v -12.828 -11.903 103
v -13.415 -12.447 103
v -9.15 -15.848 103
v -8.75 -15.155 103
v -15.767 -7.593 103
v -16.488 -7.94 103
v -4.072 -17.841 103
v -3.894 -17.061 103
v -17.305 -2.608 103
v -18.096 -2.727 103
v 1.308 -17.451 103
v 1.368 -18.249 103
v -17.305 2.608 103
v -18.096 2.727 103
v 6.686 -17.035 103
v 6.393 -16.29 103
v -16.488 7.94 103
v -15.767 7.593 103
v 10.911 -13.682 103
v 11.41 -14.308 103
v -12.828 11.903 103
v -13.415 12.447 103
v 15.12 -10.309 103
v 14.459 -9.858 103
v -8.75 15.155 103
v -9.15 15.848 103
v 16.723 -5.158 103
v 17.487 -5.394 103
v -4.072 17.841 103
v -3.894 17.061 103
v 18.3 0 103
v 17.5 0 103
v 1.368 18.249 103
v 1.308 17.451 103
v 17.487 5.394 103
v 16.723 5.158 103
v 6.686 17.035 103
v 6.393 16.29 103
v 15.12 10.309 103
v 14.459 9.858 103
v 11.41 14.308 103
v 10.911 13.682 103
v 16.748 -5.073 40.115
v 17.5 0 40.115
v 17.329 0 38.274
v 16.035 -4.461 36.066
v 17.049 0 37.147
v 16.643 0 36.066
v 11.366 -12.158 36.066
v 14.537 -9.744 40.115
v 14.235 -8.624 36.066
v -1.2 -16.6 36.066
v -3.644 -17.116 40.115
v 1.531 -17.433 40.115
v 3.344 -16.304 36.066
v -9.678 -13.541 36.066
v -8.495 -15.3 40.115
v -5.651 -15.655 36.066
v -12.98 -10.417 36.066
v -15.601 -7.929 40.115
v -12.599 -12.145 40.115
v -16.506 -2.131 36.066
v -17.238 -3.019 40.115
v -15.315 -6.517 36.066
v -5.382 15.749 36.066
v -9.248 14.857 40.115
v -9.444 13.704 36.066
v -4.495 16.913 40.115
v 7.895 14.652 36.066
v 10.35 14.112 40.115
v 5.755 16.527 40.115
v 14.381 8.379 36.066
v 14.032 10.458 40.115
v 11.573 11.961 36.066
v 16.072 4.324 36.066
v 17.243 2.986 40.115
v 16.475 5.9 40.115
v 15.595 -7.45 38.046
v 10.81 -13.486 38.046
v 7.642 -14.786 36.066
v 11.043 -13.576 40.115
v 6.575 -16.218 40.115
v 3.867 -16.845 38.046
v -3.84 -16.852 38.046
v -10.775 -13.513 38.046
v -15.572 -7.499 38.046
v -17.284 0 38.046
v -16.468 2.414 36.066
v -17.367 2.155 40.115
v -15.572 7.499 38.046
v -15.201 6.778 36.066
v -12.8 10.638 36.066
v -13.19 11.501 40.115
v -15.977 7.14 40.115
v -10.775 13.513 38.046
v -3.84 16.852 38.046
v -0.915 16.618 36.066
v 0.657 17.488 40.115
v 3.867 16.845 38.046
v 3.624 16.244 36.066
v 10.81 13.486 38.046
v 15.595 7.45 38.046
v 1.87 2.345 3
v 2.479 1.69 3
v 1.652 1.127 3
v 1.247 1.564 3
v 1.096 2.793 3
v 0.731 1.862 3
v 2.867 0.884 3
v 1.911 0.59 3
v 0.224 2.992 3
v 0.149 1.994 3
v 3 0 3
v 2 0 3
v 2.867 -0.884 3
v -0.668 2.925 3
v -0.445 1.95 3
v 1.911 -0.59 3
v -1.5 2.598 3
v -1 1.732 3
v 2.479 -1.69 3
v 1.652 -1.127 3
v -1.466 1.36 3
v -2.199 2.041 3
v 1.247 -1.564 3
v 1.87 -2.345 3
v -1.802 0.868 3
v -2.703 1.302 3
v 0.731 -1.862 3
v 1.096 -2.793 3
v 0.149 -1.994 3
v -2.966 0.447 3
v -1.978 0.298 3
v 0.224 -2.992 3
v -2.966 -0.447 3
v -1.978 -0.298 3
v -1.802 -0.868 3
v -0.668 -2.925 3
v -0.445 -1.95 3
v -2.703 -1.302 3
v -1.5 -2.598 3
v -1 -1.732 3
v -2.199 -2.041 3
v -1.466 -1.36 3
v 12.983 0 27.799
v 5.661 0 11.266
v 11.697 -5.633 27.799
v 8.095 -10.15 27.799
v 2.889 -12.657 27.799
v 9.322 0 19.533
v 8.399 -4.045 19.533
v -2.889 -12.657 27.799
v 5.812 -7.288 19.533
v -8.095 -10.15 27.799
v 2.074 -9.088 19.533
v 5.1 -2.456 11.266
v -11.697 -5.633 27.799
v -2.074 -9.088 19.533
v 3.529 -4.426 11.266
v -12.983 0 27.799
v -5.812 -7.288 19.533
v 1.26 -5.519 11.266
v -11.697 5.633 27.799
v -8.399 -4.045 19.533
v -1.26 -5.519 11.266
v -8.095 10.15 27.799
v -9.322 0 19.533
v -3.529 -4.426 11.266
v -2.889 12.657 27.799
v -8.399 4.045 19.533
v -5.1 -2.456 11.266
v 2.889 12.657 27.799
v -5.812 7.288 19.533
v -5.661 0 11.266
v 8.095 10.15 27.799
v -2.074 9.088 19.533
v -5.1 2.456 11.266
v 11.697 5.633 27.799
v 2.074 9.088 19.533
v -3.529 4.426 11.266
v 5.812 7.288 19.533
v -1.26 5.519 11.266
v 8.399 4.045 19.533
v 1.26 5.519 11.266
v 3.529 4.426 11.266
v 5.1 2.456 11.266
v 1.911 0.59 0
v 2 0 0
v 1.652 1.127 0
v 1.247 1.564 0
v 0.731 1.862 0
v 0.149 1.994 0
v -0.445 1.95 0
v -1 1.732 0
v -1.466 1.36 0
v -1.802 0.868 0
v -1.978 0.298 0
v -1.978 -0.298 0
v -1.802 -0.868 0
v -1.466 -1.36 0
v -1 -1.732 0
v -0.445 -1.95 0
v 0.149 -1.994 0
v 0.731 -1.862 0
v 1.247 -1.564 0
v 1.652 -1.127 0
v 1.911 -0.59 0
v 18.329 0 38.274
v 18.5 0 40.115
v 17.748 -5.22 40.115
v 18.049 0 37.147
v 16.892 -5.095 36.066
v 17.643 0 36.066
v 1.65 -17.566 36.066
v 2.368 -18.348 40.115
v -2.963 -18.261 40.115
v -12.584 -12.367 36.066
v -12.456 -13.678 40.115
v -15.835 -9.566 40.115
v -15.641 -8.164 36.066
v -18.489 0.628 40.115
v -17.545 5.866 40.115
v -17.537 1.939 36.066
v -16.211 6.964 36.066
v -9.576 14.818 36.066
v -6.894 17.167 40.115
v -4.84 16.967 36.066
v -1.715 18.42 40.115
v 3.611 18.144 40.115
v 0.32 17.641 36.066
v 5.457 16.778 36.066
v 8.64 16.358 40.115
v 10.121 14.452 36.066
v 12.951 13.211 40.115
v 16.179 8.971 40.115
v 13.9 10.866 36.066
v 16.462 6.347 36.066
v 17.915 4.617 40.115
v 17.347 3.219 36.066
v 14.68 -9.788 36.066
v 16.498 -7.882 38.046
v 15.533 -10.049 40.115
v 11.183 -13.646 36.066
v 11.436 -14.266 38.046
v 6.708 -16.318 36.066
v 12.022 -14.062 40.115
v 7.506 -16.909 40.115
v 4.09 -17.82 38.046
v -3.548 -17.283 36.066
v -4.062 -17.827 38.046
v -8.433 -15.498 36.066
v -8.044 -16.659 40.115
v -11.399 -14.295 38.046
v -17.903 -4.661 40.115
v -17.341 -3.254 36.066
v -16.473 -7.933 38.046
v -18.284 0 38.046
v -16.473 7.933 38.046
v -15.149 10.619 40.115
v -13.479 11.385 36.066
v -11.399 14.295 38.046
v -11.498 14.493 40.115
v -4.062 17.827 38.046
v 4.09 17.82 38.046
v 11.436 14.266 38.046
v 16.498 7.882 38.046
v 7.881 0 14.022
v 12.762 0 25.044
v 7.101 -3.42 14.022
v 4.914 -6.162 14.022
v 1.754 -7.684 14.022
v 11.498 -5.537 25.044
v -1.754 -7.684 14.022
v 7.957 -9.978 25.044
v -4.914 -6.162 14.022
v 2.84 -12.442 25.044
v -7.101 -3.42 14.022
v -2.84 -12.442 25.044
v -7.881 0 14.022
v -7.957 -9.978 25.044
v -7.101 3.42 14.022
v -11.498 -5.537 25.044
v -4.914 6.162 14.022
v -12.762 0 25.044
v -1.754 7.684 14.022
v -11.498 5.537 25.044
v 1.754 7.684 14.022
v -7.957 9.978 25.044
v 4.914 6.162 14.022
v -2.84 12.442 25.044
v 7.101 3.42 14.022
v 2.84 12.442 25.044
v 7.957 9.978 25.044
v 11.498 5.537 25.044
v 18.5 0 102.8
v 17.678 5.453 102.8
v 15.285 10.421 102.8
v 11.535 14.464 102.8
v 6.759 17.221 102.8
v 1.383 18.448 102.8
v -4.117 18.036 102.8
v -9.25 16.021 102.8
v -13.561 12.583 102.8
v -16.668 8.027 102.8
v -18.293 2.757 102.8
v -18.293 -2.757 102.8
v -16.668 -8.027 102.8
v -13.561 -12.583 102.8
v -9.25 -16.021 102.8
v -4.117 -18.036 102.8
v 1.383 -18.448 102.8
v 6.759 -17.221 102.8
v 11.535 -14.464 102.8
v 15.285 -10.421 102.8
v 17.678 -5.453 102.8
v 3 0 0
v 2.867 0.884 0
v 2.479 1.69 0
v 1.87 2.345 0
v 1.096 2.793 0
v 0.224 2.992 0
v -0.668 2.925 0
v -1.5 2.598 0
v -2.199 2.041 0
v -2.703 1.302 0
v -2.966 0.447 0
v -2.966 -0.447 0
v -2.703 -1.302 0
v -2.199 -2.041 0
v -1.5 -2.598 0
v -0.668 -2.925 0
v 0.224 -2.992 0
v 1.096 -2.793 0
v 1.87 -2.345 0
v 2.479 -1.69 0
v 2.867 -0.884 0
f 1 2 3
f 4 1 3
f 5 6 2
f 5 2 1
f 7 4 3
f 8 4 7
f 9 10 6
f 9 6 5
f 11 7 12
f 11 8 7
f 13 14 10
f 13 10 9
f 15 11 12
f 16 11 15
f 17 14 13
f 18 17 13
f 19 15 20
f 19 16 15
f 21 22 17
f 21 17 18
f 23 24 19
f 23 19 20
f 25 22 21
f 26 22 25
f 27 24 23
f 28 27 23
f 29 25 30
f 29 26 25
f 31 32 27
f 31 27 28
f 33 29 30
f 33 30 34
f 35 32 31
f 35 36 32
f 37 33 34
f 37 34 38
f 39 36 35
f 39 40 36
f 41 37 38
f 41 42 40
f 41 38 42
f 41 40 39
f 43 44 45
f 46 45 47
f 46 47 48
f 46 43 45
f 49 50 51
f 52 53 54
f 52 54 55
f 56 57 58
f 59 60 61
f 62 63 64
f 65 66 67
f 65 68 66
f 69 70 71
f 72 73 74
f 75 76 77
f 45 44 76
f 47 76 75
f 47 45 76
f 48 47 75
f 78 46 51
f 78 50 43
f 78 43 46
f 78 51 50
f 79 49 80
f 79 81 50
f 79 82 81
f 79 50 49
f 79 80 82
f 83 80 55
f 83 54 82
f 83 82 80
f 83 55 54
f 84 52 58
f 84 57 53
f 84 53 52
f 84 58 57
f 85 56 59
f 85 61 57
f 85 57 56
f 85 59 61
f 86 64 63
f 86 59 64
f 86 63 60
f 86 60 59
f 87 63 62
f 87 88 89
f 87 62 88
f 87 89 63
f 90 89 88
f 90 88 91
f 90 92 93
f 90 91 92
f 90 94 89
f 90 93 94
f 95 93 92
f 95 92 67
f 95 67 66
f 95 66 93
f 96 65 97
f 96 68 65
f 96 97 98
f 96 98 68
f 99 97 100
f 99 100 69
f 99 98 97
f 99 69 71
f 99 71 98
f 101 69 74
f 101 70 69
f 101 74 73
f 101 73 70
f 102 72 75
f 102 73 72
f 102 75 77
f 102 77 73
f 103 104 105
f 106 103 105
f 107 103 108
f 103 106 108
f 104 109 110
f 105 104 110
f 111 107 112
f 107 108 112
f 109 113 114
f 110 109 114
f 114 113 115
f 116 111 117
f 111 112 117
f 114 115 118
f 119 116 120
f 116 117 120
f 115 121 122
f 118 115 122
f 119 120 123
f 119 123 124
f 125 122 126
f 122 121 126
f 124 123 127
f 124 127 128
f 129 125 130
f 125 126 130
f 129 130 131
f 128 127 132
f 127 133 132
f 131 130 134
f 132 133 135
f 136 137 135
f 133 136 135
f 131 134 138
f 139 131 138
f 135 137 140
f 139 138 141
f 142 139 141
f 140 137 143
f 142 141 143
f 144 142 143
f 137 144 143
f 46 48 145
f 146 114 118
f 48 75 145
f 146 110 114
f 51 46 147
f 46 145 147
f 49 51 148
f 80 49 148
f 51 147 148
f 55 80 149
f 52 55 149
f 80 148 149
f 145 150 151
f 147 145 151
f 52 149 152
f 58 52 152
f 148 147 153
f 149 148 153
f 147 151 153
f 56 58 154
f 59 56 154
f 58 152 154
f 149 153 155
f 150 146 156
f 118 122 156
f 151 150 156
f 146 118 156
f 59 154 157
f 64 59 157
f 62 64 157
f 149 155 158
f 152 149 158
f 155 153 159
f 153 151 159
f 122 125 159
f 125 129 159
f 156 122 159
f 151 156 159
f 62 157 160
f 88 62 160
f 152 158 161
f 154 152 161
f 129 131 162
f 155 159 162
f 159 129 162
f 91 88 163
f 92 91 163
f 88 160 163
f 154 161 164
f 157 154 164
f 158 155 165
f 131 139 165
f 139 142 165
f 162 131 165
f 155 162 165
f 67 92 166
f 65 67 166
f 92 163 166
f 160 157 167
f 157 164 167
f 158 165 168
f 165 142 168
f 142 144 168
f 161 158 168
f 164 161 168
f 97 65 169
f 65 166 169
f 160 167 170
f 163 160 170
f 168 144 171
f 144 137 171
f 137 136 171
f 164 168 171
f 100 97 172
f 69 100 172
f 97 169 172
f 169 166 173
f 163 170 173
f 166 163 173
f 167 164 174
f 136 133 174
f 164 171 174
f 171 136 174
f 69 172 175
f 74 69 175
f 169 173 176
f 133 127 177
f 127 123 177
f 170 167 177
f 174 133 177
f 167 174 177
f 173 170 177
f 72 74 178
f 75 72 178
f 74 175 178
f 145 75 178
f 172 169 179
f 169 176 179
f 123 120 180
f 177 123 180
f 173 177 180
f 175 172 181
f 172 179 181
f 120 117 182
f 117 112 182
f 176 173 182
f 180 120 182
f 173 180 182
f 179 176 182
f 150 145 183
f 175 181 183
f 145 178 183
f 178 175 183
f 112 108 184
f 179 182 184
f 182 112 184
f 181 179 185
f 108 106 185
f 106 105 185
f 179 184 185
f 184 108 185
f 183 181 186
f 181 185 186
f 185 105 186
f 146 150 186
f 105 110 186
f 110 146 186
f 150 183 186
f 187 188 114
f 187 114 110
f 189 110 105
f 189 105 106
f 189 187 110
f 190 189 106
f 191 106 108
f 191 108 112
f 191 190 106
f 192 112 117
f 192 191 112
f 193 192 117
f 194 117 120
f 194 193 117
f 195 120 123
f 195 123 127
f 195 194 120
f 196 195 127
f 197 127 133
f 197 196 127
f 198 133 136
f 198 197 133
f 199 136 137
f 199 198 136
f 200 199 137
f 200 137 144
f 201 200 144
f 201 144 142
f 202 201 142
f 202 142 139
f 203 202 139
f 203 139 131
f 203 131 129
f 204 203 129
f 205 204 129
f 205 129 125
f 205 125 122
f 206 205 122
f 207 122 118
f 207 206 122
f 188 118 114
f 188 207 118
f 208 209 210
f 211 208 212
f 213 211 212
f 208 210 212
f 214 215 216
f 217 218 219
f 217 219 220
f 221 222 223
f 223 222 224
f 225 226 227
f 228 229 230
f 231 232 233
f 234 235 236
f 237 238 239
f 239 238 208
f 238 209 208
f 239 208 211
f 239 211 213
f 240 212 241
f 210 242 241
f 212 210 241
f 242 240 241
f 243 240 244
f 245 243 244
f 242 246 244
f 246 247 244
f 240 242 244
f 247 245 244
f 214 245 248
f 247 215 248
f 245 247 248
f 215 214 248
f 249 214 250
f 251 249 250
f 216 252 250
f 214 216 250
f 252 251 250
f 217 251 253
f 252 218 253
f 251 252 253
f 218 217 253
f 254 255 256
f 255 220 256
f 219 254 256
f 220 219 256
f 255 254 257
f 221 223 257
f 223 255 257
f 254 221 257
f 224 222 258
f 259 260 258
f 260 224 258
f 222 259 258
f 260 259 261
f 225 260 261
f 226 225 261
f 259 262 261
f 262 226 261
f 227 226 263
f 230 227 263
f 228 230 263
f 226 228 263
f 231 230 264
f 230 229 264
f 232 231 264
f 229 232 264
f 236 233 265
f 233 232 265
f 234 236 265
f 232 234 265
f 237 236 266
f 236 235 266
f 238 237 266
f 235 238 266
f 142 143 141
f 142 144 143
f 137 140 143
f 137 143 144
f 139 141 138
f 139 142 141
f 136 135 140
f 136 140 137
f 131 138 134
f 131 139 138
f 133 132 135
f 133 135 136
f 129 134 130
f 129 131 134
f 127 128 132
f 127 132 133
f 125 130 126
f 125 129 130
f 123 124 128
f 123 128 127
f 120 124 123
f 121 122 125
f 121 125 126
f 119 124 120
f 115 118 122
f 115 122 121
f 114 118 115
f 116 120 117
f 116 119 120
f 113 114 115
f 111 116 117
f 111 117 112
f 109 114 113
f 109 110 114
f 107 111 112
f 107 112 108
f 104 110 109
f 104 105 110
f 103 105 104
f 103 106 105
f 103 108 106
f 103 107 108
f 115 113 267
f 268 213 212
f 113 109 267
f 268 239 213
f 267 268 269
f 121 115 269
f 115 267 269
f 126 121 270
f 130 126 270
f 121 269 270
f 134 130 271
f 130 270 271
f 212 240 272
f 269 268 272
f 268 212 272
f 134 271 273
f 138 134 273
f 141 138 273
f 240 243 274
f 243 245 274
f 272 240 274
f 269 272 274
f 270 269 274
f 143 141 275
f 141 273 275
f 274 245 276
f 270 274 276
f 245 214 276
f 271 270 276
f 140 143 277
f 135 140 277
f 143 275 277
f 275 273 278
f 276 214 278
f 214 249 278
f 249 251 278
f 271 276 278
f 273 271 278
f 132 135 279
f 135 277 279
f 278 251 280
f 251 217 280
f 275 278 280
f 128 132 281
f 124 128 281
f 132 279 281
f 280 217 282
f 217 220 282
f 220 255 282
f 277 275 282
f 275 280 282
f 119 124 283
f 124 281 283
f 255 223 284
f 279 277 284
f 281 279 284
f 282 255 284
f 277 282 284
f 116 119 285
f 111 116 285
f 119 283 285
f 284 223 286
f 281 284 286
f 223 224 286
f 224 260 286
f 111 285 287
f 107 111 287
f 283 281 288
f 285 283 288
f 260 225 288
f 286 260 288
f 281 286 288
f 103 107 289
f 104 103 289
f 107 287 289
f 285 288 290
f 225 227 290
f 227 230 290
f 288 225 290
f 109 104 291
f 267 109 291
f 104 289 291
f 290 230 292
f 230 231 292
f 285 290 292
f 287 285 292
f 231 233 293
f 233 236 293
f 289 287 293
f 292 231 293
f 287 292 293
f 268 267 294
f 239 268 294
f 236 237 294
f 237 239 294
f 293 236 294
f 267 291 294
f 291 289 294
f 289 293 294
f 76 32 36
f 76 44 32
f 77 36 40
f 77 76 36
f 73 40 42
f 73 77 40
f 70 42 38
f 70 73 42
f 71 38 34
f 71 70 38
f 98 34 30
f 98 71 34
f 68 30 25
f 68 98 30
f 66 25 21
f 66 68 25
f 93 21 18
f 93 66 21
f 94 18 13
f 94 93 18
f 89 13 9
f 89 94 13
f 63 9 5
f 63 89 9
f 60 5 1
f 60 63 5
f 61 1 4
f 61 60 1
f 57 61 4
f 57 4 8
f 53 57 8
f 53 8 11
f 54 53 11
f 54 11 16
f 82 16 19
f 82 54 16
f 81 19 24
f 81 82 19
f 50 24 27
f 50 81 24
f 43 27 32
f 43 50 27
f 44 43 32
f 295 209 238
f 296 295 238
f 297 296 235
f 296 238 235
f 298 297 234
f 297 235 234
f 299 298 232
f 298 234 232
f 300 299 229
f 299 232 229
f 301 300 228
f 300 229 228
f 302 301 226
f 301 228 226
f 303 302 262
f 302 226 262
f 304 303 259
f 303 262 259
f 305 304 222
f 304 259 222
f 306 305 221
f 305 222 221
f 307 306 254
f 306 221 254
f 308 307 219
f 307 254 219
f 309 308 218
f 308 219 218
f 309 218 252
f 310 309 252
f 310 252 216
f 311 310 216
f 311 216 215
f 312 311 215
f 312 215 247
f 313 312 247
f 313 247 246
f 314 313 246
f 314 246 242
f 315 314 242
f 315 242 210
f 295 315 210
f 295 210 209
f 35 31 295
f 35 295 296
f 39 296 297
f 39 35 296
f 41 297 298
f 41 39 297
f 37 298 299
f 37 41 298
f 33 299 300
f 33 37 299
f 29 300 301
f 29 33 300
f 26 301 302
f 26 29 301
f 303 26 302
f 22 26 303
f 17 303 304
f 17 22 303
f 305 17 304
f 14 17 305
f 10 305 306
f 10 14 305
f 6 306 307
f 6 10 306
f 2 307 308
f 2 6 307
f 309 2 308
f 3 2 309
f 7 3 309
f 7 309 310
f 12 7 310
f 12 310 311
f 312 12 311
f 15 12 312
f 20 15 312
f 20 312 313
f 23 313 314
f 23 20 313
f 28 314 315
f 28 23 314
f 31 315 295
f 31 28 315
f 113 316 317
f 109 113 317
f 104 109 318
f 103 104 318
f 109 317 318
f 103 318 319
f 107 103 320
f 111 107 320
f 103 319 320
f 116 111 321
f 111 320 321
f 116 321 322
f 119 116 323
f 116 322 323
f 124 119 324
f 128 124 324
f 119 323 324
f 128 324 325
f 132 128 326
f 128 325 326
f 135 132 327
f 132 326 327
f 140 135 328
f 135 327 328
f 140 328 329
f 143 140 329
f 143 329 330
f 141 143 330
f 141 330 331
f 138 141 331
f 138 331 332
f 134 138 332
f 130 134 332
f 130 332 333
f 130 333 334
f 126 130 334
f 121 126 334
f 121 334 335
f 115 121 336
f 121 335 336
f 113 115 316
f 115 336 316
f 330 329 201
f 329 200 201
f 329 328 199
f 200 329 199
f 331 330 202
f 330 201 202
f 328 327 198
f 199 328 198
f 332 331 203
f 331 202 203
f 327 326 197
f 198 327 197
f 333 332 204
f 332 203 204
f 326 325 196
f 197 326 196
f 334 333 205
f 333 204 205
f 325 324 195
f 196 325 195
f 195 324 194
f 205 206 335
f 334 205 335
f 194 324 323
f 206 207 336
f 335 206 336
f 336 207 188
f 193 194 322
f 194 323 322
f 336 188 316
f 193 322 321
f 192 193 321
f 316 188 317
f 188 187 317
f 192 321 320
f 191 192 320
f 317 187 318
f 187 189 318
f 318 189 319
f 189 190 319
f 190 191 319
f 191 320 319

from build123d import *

# Parameters (mm, degrees)
F0_R      = 3
F0_R_2    = 2
F1_DEPTH  = 3
F7_R      = 18.5
F7_R_2    = 17.5
F8_DEPTH  = 55
F9_R      = 10
F10_R     = 18.5
F10_R_2   = 17.5
F11_DEPTH = 10
F12_SIZE  = 0.2


with BuildPart() as f1:
    # F0 (on Top) → F1 (new body)
    with BuildSketch(Plane.XY):
        Circle(F0_R)
        Circle(F0_R_2, mode=Mode.SUBTRACT)
    extrude(amount=F1_DEPTH)


with BuildPart() as f6:
    # F5 (on Front) → F6 (revolve)
    with BuildSketch(Plane.XZ):
        Polygon((2, 3), (3, 3), (18.5, 38), (17.5, 38), align=None)
    revolve(axis=Axis((0, 0, 13.0933627952), (0, 0, -1)))

    # F7 (on face) → F8 (join)
    with BuildSketch(Plane.XY.offset(38)):
        Circle(F7_R)
        Circle(F7_R_2, mode=Mode.SUBTRACT)
    extrude(amount=F8_DEPTH)

    # F9
    f9_edges = [f6.edges().sort_by_distance(p)[0] for p in [
        (-18.5, 0, 38),
        (-17.5, 0, 38),
    ]]
    fillet(f9_edges, radius=F9_R)

    # F10 (on face) → F11 (join)
    with BuildSketch(Plane.XY.offset(93)):
        Circle(F10_R)
        Circle(F10_R_2, mode=Mode.SUBTRACT)
    extrude(amount=F11_DEPTH)

    # F12
    f12_edges = [f6.edges().sort_by_distance(p)[0] for p in [
        (-18.5, 0, 103),
    ]]
    chamfer(f12_edges, length=F12_SIZE)


solid = Compound([f1.part, f6.part])
